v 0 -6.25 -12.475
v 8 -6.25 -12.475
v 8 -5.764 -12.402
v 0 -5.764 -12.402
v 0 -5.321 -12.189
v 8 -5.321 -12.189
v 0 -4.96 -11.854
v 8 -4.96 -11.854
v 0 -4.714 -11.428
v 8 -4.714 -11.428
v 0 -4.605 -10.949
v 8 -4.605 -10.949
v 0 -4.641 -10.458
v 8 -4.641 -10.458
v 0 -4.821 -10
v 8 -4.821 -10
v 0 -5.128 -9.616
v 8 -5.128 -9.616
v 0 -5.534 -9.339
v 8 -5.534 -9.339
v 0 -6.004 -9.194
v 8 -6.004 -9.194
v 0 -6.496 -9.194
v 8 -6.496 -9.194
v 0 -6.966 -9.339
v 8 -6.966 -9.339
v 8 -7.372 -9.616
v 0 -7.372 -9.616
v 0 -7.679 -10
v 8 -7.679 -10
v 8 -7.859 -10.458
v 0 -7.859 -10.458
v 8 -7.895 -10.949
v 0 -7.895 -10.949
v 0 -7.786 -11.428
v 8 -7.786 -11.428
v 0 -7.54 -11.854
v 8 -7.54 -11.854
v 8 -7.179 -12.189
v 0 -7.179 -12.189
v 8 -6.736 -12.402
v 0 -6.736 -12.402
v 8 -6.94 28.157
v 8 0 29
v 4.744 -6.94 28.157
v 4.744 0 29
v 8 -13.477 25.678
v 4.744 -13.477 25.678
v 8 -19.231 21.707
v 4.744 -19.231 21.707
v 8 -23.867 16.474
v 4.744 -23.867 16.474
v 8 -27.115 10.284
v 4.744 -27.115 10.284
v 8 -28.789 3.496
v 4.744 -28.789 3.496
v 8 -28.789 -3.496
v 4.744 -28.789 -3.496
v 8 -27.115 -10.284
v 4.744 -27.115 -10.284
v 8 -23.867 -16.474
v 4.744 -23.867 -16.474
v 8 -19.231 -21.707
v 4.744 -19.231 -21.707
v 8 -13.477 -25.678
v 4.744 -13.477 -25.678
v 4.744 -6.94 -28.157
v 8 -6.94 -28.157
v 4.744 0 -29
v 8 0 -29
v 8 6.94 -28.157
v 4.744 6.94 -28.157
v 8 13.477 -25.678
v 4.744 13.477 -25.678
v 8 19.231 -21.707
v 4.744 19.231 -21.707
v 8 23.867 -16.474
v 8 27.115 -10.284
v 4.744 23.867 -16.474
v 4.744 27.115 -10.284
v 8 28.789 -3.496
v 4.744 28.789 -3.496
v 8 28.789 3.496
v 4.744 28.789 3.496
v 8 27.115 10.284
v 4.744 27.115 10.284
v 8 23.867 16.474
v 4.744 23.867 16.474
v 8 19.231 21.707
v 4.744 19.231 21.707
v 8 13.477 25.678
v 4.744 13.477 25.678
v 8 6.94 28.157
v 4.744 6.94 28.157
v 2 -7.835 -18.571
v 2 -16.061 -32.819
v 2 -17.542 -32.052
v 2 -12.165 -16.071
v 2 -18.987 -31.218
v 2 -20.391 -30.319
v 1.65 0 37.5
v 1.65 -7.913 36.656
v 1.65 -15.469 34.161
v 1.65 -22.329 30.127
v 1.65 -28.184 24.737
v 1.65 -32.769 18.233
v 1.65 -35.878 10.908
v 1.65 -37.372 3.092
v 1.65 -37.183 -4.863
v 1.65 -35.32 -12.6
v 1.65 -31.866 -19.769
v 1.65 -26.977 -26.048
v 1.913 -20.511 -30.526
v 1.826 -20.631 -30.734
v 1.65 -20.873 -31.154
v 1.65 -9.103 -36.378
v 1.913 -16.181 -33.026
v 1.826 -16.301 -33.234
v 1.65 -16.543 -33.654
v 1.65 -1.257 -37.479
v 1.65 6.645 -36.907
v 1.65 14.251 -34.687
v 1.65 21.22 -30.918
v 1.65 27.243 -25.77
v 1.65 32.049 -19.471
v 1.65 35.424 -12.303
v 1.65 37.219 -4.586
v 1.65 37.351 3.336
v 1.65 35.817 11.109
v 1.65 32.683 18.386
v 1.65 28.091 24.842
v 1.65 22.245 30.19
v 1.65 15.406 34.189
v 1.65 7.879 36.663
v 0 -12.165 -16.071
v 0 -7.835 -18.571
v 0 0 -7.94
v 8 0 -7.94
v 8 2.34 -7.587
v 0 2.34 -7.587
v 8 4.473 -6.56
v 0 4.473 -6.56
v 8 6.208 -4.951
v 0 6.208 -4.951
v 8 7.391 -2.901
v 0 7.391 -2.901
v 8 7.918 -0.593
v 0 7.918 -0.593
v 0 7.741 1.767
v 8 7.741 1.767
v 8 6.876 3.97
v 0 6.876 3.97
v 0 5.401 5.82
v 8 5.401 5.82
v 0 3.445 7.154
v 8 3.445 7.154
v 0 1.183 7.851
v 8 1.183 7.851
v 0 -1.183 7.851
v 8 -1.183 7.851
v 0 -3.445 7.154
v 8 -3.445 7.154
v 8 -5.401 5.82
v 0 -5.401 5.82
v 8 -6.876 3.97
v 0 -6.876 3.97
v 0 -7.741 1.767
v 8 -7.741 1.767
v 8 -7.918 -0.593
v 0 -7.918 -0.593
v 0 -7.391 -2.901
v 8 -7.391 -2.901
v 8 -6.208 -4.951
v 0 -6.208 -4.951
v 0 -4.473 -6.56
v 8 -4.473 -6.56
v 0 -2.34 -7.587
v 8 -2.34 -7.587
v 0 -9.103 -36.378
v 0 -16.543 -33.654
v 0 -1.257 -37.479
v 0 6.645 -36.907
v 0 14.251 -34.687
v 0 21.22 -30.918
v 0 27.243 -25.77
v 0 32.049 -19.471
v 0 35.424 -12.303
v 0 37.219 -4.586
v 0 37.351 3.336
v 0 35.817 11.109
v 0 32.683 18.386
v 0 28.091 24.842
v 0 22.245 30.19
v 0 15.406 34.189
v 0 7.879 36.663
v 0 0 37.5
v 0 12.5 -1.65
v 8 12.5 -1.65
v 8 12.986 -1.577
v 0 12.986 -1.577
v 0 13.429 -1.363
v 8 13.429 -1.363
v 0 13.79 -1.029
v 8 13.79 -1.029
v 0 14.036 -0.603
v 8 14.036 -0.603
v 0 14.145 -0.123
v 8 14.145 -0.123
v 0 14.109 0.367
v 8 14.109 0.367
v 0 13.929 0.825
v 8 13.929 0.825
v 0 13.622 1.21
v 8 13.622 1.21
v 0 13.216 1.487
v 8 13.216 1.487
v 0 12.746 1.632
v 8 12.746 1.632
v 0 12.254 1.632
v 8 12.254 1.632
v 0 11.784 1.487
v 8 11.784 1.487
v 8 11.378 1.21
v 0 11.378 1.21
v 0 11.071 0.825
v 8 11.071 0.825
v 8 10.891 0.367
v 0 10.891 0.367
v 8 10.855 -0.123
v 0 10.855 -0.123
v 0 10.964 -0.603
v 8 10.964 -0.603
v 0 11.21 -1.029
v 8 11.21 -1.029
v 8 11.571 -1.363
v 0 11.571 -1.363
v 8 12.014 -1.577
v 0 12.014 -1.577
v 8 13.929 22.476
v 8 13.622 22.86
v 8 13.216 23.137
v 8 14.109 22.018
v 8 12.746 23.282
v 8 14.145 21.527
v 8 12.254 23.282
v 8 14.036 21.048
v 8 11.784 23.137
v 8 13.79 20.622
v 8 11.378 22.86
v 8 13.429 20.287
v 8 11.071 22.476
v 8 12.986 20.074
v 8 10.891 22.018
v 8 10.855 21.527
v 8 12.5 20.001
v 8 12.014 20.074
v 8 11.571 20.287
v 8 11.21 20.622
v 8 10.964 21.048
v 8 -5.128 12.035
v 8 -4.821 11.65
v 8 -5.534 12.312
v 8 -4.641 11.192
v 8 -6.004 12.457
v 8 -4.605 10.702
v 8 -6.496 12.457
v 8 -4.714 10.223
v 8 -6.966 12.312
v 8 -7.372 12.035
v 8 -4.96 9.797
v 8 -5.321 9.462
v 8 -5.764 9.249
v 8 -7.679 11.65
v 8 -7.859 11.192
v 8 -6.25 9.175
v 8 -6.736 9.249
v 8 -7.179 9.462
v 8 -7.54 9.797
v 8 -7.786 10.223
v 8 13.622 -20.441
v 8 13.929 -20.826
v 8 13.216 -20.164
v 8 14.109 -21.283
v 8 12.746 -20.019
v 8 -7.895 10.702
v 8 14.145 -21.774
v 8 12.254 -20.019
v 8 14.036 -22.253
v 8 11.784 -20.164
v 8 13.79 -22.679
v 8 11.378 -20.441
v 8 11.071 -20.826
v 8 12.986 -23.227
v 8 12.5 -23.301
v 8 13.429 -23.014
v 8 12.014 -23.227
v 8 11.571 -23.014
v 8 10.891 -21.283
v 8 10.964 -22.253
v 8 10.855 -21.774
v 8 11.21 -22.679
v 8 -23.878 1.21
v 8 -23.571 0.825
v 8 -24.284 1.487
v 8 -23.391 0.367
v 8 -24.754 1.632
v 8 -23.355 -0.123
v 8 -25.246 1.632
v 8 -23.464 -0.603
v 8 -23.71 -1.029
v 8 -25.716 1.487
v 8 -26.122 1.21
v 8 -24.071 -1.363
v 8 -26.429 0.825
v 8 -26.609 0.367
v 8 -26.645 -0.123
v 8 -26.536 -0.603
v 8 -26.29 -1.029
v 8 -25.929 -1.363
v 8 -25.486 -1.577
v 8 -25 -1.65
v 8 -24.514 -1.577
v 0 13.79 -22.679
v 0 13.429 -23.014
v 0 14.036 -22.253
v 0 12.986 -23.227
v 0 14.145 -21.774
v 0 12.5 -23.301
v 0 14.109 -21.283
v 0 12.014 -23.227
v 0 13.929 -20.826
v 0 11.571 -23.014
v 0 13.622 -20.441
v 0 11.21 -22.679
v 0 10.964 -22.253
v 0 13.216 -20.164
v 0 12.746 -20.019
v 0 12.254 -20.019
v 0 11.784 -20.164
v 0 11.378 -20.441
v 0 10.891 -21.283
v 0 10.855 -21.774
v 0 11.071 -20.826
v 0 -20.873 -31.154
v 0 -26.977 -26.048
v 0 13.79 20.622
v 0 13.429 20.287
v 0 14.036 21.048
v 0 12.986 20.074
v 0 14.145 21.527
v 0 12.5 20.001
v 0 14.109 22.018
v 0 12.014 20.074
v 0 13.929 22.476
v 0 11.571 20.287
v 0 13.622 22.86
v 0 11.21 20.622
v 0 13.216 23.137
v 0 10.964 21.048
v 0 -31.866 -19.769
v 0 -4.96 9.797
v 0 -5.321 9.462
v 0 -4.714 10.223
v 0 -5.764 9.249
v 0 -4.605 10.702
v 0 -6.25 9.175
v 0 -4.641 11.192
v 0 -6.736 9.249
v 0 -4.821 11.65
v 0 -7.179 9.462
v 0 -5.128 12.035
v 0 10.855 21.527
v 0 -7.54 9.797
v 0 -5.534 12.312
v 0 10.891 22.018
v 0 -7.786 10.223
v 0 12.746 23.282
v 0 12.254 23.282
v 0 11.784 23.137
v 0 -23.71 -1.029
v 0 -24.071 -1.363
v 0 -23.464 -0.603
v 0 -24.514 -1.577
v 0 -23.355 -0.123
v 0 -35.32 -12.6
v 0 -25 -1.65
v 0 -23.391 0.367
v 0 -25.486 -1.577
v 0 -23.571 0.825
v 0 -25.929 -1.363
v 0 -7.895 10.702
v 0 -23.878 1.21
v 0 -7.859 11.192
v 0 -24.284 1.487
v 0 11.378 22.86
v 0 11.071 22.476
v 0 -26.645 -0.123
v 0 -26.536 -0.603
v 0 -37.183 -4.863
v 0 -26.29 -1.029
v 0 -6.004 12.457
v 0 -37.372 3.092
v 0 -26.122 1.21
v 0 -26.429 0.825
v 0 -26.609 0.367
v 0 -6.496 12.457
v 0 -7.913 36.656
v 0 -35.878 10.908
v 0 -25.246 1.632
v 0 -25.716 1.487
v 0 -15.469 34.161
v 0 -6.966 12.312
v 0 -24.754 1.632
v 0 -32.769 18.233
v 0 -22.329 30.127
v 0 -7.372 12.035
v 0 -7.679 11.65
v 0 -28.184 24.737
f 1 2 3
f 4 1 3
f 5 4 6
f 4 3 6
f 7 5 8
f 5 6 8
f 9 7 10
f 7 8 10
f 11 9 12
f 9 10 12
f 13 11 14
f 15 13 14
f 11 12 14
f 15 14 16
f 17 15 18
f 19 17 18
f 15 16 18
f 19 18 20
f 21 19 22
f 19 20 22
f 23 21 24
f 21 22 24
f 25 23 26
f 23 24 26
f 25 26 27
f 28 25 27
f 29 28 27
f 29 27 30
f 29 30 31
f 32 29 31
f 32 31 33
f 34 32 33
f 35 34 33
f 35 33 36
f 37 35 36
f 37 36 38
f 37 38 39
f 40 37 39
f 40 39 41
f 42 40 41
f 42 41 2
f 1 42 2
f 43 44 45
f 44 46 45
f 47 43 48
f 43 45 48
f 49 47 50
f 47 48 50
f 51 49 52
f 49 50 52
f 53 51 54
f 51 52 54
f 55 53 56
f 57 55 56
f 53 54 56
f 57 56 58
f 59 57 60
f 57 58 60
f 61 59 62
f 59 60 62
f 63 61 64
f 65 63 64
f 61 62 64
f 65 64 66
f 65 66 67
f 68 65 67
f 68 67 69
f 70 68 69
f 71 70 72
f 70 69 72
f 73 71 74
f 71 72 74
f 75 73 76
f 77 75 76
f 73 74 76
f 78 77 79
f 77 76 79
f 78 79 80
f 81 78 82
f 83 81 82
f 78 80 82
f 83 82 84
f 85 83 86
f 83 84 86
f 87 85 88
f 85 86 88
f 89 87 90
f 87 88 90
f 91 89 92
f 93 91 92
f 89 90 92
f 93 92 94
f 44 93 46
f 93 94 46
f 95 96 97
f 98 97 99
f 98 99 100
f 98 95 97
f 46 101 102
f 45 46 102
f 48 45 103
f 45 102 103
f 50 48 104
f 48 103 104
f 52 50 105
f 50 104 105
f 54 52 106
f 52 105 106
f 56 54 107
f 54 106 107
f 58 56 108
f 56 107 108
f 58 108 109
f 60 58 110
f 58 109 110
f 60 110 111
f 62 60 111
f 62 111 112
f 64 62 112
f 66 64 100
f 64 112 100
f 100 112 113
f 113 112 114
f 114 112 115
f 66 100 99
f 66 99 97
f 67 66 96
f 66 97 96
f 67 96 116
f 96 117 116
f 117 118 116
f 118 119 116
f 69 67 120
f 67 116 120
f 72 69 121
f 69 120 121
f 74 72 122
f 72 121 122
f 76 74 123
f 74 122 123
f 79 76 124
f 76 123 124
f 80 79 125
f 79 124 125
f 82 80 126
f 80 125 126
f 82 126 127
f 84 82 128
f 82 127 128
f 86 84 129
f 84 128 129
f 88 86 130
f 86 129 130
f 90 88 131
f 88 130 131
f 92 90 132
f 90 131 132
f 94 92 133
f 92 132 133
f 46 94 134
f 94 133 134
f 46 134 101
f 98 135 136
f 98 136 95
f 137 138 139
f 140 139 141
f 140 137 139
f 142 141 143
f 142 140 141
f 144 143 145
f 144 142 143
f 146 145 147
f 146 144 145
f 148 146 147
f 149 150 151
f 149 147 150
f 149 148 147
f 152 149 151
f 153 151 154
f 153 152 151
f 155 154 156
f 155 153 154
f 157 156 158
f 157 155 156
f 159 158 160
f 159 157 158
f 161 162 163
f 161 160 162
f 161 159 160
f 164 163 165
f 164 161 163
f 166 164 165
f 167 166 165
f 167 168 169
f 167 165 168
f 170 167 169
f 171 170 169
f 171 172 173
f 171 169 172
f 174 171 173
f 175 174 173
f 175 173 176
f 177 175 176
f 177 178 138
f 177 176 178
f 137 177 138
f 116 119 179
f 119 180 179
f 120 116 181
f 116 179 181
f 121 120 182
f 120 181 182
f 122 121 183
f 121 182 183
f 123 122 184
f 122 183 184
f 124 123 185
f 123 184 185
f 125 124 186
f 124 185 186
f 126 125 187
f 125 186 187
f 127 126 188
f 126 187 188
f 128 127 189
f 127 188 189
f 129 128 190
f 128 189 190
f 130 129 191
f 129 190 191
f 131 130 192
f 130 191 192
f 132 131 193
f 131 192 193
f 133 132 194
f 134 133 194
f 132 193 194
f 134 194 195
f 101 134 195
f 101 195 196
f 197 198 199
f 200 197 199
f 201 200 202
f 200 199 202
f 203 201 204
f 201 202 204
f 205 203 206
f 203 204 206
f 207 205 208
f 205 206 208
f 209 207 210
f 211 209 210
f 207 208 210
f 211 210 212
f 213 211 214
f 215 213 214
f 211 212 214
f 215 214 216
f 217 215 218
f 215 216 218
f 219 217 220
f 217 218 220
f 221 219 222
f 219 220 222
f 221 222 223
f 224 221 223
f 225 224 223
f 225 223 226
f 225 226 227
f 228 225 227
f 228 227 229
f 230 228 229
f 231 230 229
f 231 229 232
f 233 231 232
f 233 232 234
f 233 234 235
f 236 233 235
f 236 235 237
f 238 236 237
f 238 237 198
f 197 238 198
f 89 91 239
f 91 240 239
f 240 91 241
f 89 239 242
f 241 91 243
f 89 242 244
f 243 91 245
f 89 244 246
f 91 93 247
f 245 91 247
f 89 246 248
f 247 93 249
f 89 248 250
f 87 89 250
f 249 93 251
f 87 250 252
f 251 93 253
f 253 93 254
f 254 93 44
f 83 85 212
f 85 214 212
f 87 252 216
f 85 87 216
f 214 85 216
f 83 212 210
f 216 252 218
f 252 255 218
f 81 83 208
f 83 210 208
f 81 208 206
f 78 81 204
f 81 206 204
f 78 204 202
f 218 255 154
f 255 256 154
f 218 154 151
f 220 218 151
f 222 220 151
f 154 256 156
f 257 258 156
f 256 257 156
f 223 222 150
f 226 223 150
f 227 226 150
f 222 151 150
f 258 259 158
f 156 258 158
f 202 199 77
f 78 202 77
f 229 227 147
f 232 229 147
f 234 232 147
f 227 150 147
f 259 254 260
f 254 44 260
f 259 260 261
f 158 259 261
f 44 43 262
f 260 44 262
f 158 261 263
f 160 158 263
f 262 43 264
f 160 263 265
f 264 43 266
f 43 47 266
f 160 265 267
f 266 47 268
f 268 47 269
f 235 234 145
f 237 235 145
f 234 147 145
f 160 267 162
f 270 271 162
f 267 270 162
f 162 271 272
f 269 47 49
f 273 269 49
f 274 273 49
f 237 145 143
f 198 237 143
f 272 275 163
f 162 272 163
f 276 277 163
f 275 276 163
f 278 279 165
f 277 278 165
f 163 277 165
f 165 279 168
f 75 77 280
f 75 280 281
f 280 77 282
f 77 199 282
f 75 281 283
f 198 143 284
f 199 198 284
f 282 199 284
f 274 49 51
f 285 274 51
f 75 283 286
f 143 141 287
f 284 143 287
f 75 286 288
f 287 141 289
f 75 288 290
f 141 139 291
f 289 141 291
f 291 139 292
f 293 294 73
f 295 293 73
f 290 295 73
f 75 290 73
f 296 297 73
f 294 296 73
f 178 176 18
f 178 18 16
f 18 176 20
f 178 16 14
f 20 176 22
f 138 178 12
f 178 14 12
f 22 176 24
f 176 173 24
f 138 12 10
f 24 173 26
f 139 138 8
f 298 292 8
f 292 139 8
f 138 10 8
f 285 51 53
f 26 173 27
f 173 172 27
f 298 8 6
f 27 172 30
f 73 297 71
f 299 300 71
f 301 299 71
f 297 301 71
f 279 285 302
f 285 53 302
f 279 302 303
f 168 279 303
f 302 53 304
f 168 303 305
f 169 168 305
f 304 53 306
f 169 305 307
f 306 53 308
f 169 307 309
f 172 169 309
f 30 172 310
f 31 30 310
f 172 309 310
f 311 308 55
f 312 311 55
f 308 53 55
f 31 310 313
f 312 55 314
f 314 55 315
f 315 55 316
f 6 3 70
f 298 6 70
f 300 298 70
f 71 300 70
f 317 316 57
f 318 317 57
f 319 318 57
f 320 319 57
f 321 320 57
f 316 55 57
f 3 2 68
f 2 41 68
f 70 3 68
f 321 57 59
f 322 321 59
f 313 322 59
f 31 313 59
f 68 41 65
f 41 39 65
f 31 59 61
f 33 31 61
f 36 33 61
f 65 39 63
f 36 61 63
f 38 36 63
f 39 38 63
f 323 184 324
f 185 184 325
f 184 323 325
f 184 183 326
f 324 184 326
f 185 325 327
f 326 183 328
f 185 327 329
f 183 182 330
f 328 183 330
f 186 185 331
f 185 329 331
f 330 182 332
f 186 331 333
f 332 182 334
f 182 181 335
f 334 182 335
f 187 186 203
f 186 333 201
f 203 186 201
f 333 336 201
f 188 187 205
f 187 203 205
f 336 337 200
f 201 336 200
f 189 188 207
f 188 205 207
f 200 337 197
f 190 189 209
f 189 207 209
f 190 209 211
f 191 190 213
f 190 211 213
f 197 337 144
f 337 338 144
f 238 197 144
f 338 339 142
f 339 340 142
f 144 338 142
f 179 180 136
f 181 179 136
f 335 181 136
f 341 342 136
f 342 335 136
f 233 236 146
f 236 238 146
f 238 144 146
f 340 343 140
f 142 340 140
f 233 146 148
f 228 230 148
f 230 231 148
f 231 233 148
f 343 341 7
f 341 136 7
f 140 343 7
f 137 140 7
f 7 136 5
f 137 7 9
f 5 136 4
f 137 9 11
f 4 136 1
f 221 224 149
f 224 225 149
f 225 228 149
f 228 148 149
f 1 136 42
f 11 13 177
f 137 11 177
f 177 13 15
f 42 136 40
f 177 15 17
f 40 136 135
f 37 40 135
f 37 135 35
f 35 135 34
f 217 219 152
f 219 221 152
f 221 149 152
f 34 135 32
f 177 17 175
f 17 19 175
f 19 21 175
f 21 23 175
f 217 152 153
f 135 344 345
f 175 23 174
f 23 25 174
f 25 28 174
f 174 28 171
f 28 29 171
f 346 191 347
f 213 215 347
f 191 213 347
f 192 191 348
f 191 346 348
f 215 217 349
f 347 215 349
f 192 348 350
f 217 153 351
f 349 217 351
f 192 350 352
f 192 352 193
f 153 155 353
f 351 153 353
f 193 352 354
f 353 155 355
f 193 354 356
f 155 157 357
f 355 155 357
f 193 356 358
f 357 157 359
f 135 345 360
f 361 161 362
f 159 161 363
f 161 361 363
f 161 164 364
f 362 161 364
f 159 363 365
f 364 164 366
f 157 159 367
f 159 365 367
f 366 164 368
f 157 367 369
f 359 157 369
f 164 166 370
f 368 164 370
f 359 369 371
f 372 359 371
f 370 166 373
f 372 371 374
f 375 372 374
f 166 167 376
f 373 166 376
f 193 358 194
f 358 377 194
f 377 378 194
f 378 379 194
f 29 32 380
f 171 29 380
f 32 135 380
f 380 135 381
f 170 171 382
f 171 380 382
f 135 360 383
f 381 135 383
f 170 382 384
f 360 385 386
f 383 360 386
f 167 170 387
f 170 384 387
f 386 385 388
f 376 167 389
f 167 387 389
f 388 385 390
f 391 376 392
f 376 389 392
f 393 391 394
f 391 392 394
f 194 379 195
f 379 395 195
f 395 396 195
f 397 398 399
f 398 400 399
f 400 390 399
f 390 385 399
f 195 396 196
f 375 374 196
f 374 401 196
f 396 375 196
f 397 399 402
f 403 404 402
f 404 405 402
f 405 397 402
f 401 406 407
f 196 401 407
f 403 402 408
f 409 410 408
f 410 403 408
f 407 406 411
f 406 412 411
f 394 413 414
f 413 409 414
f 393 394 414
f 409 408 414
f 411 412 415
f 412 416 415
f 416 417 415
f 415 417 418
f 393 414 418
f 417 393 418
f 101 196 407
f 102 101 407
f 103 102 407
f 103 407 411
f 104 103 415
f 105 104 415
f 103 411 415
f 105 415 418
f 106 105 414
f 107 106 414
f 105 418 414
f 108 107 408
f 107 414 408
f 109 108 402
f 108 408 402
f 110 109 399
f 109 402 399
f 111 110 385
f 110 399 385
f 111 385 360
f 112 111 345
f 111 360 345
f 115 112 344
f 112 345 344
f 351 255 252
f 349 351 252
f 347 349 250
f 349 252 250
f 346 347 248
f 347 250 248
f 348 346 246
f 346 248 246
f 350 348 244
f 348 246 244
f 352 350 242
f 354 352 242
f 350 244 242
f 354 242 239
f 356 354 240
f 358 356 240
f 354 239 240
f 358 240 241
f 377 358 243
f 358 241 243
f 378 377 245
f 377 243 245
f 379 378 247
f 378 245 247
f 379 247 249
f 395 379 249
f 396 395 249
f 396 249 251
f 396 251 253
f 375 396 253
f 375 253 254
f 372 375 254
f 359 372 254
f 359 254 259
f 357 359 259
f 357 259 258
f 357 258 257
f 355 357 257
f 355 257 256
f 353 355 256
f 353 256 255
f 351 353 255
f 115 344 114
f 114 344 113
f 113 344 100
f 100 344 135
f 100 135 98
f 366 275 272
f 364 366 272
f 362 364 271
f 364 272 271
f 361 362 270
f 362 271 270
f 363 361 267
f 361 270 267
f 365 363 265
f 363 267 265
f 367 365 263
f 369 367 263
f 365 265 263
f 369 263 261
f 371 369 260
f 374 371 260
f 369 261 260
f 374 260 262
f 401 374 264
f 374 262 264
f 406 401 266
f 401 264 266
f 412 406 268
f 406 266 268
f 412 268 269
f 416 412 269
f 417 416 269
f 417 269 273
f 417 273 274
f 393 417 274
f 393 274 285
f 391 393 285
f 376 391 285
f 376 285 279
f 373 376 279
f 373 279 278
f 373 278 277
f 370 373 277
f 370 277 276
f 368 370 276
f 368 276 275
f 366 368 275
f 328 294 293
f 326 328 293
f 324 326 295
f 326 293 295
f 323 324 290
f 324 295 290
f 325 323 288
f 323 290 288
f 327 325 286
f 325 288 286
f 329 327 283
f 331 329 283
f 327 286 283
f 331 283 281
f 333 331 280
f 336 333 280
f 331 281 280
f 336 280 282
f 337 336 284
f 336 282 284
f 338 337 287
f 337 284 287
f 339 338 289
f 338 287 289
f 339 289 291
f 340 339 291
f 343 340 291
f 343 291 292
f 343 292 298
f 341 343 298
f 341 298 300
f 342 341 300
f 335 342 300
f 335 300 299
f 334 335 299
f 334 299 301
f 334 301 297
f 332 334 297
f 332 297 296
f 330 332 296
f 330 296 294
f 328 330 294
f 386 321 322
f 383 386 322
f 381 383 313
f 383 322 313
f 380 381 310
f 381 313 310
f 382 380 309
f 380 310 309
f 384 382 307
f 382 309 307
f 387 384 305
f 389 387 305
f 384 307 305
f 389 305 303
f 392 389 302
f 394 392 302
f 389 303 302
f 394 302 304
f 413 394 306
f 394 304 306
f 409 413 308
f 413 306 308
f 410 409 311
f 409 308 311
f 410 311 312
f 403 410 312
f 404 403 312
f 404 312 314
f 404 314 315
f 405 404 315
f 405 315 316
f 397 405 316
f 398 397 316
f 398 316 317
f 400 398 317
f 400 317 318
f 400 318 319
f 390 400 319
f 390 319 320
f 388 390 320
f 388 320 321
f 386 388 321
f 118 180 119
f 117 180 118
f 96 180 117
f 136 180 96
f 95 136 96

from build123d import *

# Parameters (mm, degrees)
SKETCH5_R          = 7.94
CUT_EXTRUDE1_DEPTH = 54.633012222
SKETCH7_R          = 1.65
CUT_EXTRUDE3_DEPTH = 54.633012222
SKETCH6_W          = 2
SKETCH6_H          = 5
CUT_EXTRUDE2_DEPTH = 65.4


with BuildPart() as part:
    # Sketch3 → Revolve1 (revolve)
    with BuildSketch(Plane.XY):
        Polygon((0, 0), (8, 0), (8, 29), (4.743746991, 29), (1.65, 37.5), (0, 37.5), align=None)
    revolve(axis=Axis((0, 0, 0), (1, 0, 0)))

    # Sketch5 → Cut-Extrude1 (cut, through all)
    with BuildSketch(Plane(origin=(0, 0, 0), x_dir=(0, 0, -1), z_dir=(1, 0, 0))):
        Circle(SKETCH5_R)
    extrude(amount=CUT_EXTRUDE1_DEPTH, mode=Mode.SUBTRACT)

    # Sketch7 → Cut-Extrude3 (cut, through all)
    with BuildSketch(Plane(origin=(8, 0, 0), x_dir=(0, 0, -1), z_dir=(1, 0, 0))):
        with Locations((0, 12.5)):
            Circle(SKETCH7_R)
        with Locations((-10.825317547, -6.25)):
            Circle(SKETCH7_R)
        with Locations((10.825317547, -6.25)):
            Circle(SKETCH7_R)
        with Locations((-21.650635095, 12.5)):
            Circle(SKETCH7_R)
        with Locations((21.650635095, 12.5)):
            Circle(SKETCH7_R)
        with Locations((0, -25)):
            Circle(SKETCH7_R)
    extrude(amount=-CUT_EXTRUDE3_DEPTH, mode=Mode.SUBTRACT)

    # Sketch6 → Cut-Extrude2 (cut)
    with BuildSketch(Plane(origin=(0, -38.5, -0.866025404), x_dir=(1, 0, 0), z_dir=(0, -0.499999999999998, -0.8660254037844398))):
        with Locations((1, -32.908965344)):
            Rectangle(SKETCH6_W, SKETCH6_H)
    extrude(amount=CUT_EXTRUDE2_DEPTH, mode=Mode.SUBTRACT)


solid = part.part
